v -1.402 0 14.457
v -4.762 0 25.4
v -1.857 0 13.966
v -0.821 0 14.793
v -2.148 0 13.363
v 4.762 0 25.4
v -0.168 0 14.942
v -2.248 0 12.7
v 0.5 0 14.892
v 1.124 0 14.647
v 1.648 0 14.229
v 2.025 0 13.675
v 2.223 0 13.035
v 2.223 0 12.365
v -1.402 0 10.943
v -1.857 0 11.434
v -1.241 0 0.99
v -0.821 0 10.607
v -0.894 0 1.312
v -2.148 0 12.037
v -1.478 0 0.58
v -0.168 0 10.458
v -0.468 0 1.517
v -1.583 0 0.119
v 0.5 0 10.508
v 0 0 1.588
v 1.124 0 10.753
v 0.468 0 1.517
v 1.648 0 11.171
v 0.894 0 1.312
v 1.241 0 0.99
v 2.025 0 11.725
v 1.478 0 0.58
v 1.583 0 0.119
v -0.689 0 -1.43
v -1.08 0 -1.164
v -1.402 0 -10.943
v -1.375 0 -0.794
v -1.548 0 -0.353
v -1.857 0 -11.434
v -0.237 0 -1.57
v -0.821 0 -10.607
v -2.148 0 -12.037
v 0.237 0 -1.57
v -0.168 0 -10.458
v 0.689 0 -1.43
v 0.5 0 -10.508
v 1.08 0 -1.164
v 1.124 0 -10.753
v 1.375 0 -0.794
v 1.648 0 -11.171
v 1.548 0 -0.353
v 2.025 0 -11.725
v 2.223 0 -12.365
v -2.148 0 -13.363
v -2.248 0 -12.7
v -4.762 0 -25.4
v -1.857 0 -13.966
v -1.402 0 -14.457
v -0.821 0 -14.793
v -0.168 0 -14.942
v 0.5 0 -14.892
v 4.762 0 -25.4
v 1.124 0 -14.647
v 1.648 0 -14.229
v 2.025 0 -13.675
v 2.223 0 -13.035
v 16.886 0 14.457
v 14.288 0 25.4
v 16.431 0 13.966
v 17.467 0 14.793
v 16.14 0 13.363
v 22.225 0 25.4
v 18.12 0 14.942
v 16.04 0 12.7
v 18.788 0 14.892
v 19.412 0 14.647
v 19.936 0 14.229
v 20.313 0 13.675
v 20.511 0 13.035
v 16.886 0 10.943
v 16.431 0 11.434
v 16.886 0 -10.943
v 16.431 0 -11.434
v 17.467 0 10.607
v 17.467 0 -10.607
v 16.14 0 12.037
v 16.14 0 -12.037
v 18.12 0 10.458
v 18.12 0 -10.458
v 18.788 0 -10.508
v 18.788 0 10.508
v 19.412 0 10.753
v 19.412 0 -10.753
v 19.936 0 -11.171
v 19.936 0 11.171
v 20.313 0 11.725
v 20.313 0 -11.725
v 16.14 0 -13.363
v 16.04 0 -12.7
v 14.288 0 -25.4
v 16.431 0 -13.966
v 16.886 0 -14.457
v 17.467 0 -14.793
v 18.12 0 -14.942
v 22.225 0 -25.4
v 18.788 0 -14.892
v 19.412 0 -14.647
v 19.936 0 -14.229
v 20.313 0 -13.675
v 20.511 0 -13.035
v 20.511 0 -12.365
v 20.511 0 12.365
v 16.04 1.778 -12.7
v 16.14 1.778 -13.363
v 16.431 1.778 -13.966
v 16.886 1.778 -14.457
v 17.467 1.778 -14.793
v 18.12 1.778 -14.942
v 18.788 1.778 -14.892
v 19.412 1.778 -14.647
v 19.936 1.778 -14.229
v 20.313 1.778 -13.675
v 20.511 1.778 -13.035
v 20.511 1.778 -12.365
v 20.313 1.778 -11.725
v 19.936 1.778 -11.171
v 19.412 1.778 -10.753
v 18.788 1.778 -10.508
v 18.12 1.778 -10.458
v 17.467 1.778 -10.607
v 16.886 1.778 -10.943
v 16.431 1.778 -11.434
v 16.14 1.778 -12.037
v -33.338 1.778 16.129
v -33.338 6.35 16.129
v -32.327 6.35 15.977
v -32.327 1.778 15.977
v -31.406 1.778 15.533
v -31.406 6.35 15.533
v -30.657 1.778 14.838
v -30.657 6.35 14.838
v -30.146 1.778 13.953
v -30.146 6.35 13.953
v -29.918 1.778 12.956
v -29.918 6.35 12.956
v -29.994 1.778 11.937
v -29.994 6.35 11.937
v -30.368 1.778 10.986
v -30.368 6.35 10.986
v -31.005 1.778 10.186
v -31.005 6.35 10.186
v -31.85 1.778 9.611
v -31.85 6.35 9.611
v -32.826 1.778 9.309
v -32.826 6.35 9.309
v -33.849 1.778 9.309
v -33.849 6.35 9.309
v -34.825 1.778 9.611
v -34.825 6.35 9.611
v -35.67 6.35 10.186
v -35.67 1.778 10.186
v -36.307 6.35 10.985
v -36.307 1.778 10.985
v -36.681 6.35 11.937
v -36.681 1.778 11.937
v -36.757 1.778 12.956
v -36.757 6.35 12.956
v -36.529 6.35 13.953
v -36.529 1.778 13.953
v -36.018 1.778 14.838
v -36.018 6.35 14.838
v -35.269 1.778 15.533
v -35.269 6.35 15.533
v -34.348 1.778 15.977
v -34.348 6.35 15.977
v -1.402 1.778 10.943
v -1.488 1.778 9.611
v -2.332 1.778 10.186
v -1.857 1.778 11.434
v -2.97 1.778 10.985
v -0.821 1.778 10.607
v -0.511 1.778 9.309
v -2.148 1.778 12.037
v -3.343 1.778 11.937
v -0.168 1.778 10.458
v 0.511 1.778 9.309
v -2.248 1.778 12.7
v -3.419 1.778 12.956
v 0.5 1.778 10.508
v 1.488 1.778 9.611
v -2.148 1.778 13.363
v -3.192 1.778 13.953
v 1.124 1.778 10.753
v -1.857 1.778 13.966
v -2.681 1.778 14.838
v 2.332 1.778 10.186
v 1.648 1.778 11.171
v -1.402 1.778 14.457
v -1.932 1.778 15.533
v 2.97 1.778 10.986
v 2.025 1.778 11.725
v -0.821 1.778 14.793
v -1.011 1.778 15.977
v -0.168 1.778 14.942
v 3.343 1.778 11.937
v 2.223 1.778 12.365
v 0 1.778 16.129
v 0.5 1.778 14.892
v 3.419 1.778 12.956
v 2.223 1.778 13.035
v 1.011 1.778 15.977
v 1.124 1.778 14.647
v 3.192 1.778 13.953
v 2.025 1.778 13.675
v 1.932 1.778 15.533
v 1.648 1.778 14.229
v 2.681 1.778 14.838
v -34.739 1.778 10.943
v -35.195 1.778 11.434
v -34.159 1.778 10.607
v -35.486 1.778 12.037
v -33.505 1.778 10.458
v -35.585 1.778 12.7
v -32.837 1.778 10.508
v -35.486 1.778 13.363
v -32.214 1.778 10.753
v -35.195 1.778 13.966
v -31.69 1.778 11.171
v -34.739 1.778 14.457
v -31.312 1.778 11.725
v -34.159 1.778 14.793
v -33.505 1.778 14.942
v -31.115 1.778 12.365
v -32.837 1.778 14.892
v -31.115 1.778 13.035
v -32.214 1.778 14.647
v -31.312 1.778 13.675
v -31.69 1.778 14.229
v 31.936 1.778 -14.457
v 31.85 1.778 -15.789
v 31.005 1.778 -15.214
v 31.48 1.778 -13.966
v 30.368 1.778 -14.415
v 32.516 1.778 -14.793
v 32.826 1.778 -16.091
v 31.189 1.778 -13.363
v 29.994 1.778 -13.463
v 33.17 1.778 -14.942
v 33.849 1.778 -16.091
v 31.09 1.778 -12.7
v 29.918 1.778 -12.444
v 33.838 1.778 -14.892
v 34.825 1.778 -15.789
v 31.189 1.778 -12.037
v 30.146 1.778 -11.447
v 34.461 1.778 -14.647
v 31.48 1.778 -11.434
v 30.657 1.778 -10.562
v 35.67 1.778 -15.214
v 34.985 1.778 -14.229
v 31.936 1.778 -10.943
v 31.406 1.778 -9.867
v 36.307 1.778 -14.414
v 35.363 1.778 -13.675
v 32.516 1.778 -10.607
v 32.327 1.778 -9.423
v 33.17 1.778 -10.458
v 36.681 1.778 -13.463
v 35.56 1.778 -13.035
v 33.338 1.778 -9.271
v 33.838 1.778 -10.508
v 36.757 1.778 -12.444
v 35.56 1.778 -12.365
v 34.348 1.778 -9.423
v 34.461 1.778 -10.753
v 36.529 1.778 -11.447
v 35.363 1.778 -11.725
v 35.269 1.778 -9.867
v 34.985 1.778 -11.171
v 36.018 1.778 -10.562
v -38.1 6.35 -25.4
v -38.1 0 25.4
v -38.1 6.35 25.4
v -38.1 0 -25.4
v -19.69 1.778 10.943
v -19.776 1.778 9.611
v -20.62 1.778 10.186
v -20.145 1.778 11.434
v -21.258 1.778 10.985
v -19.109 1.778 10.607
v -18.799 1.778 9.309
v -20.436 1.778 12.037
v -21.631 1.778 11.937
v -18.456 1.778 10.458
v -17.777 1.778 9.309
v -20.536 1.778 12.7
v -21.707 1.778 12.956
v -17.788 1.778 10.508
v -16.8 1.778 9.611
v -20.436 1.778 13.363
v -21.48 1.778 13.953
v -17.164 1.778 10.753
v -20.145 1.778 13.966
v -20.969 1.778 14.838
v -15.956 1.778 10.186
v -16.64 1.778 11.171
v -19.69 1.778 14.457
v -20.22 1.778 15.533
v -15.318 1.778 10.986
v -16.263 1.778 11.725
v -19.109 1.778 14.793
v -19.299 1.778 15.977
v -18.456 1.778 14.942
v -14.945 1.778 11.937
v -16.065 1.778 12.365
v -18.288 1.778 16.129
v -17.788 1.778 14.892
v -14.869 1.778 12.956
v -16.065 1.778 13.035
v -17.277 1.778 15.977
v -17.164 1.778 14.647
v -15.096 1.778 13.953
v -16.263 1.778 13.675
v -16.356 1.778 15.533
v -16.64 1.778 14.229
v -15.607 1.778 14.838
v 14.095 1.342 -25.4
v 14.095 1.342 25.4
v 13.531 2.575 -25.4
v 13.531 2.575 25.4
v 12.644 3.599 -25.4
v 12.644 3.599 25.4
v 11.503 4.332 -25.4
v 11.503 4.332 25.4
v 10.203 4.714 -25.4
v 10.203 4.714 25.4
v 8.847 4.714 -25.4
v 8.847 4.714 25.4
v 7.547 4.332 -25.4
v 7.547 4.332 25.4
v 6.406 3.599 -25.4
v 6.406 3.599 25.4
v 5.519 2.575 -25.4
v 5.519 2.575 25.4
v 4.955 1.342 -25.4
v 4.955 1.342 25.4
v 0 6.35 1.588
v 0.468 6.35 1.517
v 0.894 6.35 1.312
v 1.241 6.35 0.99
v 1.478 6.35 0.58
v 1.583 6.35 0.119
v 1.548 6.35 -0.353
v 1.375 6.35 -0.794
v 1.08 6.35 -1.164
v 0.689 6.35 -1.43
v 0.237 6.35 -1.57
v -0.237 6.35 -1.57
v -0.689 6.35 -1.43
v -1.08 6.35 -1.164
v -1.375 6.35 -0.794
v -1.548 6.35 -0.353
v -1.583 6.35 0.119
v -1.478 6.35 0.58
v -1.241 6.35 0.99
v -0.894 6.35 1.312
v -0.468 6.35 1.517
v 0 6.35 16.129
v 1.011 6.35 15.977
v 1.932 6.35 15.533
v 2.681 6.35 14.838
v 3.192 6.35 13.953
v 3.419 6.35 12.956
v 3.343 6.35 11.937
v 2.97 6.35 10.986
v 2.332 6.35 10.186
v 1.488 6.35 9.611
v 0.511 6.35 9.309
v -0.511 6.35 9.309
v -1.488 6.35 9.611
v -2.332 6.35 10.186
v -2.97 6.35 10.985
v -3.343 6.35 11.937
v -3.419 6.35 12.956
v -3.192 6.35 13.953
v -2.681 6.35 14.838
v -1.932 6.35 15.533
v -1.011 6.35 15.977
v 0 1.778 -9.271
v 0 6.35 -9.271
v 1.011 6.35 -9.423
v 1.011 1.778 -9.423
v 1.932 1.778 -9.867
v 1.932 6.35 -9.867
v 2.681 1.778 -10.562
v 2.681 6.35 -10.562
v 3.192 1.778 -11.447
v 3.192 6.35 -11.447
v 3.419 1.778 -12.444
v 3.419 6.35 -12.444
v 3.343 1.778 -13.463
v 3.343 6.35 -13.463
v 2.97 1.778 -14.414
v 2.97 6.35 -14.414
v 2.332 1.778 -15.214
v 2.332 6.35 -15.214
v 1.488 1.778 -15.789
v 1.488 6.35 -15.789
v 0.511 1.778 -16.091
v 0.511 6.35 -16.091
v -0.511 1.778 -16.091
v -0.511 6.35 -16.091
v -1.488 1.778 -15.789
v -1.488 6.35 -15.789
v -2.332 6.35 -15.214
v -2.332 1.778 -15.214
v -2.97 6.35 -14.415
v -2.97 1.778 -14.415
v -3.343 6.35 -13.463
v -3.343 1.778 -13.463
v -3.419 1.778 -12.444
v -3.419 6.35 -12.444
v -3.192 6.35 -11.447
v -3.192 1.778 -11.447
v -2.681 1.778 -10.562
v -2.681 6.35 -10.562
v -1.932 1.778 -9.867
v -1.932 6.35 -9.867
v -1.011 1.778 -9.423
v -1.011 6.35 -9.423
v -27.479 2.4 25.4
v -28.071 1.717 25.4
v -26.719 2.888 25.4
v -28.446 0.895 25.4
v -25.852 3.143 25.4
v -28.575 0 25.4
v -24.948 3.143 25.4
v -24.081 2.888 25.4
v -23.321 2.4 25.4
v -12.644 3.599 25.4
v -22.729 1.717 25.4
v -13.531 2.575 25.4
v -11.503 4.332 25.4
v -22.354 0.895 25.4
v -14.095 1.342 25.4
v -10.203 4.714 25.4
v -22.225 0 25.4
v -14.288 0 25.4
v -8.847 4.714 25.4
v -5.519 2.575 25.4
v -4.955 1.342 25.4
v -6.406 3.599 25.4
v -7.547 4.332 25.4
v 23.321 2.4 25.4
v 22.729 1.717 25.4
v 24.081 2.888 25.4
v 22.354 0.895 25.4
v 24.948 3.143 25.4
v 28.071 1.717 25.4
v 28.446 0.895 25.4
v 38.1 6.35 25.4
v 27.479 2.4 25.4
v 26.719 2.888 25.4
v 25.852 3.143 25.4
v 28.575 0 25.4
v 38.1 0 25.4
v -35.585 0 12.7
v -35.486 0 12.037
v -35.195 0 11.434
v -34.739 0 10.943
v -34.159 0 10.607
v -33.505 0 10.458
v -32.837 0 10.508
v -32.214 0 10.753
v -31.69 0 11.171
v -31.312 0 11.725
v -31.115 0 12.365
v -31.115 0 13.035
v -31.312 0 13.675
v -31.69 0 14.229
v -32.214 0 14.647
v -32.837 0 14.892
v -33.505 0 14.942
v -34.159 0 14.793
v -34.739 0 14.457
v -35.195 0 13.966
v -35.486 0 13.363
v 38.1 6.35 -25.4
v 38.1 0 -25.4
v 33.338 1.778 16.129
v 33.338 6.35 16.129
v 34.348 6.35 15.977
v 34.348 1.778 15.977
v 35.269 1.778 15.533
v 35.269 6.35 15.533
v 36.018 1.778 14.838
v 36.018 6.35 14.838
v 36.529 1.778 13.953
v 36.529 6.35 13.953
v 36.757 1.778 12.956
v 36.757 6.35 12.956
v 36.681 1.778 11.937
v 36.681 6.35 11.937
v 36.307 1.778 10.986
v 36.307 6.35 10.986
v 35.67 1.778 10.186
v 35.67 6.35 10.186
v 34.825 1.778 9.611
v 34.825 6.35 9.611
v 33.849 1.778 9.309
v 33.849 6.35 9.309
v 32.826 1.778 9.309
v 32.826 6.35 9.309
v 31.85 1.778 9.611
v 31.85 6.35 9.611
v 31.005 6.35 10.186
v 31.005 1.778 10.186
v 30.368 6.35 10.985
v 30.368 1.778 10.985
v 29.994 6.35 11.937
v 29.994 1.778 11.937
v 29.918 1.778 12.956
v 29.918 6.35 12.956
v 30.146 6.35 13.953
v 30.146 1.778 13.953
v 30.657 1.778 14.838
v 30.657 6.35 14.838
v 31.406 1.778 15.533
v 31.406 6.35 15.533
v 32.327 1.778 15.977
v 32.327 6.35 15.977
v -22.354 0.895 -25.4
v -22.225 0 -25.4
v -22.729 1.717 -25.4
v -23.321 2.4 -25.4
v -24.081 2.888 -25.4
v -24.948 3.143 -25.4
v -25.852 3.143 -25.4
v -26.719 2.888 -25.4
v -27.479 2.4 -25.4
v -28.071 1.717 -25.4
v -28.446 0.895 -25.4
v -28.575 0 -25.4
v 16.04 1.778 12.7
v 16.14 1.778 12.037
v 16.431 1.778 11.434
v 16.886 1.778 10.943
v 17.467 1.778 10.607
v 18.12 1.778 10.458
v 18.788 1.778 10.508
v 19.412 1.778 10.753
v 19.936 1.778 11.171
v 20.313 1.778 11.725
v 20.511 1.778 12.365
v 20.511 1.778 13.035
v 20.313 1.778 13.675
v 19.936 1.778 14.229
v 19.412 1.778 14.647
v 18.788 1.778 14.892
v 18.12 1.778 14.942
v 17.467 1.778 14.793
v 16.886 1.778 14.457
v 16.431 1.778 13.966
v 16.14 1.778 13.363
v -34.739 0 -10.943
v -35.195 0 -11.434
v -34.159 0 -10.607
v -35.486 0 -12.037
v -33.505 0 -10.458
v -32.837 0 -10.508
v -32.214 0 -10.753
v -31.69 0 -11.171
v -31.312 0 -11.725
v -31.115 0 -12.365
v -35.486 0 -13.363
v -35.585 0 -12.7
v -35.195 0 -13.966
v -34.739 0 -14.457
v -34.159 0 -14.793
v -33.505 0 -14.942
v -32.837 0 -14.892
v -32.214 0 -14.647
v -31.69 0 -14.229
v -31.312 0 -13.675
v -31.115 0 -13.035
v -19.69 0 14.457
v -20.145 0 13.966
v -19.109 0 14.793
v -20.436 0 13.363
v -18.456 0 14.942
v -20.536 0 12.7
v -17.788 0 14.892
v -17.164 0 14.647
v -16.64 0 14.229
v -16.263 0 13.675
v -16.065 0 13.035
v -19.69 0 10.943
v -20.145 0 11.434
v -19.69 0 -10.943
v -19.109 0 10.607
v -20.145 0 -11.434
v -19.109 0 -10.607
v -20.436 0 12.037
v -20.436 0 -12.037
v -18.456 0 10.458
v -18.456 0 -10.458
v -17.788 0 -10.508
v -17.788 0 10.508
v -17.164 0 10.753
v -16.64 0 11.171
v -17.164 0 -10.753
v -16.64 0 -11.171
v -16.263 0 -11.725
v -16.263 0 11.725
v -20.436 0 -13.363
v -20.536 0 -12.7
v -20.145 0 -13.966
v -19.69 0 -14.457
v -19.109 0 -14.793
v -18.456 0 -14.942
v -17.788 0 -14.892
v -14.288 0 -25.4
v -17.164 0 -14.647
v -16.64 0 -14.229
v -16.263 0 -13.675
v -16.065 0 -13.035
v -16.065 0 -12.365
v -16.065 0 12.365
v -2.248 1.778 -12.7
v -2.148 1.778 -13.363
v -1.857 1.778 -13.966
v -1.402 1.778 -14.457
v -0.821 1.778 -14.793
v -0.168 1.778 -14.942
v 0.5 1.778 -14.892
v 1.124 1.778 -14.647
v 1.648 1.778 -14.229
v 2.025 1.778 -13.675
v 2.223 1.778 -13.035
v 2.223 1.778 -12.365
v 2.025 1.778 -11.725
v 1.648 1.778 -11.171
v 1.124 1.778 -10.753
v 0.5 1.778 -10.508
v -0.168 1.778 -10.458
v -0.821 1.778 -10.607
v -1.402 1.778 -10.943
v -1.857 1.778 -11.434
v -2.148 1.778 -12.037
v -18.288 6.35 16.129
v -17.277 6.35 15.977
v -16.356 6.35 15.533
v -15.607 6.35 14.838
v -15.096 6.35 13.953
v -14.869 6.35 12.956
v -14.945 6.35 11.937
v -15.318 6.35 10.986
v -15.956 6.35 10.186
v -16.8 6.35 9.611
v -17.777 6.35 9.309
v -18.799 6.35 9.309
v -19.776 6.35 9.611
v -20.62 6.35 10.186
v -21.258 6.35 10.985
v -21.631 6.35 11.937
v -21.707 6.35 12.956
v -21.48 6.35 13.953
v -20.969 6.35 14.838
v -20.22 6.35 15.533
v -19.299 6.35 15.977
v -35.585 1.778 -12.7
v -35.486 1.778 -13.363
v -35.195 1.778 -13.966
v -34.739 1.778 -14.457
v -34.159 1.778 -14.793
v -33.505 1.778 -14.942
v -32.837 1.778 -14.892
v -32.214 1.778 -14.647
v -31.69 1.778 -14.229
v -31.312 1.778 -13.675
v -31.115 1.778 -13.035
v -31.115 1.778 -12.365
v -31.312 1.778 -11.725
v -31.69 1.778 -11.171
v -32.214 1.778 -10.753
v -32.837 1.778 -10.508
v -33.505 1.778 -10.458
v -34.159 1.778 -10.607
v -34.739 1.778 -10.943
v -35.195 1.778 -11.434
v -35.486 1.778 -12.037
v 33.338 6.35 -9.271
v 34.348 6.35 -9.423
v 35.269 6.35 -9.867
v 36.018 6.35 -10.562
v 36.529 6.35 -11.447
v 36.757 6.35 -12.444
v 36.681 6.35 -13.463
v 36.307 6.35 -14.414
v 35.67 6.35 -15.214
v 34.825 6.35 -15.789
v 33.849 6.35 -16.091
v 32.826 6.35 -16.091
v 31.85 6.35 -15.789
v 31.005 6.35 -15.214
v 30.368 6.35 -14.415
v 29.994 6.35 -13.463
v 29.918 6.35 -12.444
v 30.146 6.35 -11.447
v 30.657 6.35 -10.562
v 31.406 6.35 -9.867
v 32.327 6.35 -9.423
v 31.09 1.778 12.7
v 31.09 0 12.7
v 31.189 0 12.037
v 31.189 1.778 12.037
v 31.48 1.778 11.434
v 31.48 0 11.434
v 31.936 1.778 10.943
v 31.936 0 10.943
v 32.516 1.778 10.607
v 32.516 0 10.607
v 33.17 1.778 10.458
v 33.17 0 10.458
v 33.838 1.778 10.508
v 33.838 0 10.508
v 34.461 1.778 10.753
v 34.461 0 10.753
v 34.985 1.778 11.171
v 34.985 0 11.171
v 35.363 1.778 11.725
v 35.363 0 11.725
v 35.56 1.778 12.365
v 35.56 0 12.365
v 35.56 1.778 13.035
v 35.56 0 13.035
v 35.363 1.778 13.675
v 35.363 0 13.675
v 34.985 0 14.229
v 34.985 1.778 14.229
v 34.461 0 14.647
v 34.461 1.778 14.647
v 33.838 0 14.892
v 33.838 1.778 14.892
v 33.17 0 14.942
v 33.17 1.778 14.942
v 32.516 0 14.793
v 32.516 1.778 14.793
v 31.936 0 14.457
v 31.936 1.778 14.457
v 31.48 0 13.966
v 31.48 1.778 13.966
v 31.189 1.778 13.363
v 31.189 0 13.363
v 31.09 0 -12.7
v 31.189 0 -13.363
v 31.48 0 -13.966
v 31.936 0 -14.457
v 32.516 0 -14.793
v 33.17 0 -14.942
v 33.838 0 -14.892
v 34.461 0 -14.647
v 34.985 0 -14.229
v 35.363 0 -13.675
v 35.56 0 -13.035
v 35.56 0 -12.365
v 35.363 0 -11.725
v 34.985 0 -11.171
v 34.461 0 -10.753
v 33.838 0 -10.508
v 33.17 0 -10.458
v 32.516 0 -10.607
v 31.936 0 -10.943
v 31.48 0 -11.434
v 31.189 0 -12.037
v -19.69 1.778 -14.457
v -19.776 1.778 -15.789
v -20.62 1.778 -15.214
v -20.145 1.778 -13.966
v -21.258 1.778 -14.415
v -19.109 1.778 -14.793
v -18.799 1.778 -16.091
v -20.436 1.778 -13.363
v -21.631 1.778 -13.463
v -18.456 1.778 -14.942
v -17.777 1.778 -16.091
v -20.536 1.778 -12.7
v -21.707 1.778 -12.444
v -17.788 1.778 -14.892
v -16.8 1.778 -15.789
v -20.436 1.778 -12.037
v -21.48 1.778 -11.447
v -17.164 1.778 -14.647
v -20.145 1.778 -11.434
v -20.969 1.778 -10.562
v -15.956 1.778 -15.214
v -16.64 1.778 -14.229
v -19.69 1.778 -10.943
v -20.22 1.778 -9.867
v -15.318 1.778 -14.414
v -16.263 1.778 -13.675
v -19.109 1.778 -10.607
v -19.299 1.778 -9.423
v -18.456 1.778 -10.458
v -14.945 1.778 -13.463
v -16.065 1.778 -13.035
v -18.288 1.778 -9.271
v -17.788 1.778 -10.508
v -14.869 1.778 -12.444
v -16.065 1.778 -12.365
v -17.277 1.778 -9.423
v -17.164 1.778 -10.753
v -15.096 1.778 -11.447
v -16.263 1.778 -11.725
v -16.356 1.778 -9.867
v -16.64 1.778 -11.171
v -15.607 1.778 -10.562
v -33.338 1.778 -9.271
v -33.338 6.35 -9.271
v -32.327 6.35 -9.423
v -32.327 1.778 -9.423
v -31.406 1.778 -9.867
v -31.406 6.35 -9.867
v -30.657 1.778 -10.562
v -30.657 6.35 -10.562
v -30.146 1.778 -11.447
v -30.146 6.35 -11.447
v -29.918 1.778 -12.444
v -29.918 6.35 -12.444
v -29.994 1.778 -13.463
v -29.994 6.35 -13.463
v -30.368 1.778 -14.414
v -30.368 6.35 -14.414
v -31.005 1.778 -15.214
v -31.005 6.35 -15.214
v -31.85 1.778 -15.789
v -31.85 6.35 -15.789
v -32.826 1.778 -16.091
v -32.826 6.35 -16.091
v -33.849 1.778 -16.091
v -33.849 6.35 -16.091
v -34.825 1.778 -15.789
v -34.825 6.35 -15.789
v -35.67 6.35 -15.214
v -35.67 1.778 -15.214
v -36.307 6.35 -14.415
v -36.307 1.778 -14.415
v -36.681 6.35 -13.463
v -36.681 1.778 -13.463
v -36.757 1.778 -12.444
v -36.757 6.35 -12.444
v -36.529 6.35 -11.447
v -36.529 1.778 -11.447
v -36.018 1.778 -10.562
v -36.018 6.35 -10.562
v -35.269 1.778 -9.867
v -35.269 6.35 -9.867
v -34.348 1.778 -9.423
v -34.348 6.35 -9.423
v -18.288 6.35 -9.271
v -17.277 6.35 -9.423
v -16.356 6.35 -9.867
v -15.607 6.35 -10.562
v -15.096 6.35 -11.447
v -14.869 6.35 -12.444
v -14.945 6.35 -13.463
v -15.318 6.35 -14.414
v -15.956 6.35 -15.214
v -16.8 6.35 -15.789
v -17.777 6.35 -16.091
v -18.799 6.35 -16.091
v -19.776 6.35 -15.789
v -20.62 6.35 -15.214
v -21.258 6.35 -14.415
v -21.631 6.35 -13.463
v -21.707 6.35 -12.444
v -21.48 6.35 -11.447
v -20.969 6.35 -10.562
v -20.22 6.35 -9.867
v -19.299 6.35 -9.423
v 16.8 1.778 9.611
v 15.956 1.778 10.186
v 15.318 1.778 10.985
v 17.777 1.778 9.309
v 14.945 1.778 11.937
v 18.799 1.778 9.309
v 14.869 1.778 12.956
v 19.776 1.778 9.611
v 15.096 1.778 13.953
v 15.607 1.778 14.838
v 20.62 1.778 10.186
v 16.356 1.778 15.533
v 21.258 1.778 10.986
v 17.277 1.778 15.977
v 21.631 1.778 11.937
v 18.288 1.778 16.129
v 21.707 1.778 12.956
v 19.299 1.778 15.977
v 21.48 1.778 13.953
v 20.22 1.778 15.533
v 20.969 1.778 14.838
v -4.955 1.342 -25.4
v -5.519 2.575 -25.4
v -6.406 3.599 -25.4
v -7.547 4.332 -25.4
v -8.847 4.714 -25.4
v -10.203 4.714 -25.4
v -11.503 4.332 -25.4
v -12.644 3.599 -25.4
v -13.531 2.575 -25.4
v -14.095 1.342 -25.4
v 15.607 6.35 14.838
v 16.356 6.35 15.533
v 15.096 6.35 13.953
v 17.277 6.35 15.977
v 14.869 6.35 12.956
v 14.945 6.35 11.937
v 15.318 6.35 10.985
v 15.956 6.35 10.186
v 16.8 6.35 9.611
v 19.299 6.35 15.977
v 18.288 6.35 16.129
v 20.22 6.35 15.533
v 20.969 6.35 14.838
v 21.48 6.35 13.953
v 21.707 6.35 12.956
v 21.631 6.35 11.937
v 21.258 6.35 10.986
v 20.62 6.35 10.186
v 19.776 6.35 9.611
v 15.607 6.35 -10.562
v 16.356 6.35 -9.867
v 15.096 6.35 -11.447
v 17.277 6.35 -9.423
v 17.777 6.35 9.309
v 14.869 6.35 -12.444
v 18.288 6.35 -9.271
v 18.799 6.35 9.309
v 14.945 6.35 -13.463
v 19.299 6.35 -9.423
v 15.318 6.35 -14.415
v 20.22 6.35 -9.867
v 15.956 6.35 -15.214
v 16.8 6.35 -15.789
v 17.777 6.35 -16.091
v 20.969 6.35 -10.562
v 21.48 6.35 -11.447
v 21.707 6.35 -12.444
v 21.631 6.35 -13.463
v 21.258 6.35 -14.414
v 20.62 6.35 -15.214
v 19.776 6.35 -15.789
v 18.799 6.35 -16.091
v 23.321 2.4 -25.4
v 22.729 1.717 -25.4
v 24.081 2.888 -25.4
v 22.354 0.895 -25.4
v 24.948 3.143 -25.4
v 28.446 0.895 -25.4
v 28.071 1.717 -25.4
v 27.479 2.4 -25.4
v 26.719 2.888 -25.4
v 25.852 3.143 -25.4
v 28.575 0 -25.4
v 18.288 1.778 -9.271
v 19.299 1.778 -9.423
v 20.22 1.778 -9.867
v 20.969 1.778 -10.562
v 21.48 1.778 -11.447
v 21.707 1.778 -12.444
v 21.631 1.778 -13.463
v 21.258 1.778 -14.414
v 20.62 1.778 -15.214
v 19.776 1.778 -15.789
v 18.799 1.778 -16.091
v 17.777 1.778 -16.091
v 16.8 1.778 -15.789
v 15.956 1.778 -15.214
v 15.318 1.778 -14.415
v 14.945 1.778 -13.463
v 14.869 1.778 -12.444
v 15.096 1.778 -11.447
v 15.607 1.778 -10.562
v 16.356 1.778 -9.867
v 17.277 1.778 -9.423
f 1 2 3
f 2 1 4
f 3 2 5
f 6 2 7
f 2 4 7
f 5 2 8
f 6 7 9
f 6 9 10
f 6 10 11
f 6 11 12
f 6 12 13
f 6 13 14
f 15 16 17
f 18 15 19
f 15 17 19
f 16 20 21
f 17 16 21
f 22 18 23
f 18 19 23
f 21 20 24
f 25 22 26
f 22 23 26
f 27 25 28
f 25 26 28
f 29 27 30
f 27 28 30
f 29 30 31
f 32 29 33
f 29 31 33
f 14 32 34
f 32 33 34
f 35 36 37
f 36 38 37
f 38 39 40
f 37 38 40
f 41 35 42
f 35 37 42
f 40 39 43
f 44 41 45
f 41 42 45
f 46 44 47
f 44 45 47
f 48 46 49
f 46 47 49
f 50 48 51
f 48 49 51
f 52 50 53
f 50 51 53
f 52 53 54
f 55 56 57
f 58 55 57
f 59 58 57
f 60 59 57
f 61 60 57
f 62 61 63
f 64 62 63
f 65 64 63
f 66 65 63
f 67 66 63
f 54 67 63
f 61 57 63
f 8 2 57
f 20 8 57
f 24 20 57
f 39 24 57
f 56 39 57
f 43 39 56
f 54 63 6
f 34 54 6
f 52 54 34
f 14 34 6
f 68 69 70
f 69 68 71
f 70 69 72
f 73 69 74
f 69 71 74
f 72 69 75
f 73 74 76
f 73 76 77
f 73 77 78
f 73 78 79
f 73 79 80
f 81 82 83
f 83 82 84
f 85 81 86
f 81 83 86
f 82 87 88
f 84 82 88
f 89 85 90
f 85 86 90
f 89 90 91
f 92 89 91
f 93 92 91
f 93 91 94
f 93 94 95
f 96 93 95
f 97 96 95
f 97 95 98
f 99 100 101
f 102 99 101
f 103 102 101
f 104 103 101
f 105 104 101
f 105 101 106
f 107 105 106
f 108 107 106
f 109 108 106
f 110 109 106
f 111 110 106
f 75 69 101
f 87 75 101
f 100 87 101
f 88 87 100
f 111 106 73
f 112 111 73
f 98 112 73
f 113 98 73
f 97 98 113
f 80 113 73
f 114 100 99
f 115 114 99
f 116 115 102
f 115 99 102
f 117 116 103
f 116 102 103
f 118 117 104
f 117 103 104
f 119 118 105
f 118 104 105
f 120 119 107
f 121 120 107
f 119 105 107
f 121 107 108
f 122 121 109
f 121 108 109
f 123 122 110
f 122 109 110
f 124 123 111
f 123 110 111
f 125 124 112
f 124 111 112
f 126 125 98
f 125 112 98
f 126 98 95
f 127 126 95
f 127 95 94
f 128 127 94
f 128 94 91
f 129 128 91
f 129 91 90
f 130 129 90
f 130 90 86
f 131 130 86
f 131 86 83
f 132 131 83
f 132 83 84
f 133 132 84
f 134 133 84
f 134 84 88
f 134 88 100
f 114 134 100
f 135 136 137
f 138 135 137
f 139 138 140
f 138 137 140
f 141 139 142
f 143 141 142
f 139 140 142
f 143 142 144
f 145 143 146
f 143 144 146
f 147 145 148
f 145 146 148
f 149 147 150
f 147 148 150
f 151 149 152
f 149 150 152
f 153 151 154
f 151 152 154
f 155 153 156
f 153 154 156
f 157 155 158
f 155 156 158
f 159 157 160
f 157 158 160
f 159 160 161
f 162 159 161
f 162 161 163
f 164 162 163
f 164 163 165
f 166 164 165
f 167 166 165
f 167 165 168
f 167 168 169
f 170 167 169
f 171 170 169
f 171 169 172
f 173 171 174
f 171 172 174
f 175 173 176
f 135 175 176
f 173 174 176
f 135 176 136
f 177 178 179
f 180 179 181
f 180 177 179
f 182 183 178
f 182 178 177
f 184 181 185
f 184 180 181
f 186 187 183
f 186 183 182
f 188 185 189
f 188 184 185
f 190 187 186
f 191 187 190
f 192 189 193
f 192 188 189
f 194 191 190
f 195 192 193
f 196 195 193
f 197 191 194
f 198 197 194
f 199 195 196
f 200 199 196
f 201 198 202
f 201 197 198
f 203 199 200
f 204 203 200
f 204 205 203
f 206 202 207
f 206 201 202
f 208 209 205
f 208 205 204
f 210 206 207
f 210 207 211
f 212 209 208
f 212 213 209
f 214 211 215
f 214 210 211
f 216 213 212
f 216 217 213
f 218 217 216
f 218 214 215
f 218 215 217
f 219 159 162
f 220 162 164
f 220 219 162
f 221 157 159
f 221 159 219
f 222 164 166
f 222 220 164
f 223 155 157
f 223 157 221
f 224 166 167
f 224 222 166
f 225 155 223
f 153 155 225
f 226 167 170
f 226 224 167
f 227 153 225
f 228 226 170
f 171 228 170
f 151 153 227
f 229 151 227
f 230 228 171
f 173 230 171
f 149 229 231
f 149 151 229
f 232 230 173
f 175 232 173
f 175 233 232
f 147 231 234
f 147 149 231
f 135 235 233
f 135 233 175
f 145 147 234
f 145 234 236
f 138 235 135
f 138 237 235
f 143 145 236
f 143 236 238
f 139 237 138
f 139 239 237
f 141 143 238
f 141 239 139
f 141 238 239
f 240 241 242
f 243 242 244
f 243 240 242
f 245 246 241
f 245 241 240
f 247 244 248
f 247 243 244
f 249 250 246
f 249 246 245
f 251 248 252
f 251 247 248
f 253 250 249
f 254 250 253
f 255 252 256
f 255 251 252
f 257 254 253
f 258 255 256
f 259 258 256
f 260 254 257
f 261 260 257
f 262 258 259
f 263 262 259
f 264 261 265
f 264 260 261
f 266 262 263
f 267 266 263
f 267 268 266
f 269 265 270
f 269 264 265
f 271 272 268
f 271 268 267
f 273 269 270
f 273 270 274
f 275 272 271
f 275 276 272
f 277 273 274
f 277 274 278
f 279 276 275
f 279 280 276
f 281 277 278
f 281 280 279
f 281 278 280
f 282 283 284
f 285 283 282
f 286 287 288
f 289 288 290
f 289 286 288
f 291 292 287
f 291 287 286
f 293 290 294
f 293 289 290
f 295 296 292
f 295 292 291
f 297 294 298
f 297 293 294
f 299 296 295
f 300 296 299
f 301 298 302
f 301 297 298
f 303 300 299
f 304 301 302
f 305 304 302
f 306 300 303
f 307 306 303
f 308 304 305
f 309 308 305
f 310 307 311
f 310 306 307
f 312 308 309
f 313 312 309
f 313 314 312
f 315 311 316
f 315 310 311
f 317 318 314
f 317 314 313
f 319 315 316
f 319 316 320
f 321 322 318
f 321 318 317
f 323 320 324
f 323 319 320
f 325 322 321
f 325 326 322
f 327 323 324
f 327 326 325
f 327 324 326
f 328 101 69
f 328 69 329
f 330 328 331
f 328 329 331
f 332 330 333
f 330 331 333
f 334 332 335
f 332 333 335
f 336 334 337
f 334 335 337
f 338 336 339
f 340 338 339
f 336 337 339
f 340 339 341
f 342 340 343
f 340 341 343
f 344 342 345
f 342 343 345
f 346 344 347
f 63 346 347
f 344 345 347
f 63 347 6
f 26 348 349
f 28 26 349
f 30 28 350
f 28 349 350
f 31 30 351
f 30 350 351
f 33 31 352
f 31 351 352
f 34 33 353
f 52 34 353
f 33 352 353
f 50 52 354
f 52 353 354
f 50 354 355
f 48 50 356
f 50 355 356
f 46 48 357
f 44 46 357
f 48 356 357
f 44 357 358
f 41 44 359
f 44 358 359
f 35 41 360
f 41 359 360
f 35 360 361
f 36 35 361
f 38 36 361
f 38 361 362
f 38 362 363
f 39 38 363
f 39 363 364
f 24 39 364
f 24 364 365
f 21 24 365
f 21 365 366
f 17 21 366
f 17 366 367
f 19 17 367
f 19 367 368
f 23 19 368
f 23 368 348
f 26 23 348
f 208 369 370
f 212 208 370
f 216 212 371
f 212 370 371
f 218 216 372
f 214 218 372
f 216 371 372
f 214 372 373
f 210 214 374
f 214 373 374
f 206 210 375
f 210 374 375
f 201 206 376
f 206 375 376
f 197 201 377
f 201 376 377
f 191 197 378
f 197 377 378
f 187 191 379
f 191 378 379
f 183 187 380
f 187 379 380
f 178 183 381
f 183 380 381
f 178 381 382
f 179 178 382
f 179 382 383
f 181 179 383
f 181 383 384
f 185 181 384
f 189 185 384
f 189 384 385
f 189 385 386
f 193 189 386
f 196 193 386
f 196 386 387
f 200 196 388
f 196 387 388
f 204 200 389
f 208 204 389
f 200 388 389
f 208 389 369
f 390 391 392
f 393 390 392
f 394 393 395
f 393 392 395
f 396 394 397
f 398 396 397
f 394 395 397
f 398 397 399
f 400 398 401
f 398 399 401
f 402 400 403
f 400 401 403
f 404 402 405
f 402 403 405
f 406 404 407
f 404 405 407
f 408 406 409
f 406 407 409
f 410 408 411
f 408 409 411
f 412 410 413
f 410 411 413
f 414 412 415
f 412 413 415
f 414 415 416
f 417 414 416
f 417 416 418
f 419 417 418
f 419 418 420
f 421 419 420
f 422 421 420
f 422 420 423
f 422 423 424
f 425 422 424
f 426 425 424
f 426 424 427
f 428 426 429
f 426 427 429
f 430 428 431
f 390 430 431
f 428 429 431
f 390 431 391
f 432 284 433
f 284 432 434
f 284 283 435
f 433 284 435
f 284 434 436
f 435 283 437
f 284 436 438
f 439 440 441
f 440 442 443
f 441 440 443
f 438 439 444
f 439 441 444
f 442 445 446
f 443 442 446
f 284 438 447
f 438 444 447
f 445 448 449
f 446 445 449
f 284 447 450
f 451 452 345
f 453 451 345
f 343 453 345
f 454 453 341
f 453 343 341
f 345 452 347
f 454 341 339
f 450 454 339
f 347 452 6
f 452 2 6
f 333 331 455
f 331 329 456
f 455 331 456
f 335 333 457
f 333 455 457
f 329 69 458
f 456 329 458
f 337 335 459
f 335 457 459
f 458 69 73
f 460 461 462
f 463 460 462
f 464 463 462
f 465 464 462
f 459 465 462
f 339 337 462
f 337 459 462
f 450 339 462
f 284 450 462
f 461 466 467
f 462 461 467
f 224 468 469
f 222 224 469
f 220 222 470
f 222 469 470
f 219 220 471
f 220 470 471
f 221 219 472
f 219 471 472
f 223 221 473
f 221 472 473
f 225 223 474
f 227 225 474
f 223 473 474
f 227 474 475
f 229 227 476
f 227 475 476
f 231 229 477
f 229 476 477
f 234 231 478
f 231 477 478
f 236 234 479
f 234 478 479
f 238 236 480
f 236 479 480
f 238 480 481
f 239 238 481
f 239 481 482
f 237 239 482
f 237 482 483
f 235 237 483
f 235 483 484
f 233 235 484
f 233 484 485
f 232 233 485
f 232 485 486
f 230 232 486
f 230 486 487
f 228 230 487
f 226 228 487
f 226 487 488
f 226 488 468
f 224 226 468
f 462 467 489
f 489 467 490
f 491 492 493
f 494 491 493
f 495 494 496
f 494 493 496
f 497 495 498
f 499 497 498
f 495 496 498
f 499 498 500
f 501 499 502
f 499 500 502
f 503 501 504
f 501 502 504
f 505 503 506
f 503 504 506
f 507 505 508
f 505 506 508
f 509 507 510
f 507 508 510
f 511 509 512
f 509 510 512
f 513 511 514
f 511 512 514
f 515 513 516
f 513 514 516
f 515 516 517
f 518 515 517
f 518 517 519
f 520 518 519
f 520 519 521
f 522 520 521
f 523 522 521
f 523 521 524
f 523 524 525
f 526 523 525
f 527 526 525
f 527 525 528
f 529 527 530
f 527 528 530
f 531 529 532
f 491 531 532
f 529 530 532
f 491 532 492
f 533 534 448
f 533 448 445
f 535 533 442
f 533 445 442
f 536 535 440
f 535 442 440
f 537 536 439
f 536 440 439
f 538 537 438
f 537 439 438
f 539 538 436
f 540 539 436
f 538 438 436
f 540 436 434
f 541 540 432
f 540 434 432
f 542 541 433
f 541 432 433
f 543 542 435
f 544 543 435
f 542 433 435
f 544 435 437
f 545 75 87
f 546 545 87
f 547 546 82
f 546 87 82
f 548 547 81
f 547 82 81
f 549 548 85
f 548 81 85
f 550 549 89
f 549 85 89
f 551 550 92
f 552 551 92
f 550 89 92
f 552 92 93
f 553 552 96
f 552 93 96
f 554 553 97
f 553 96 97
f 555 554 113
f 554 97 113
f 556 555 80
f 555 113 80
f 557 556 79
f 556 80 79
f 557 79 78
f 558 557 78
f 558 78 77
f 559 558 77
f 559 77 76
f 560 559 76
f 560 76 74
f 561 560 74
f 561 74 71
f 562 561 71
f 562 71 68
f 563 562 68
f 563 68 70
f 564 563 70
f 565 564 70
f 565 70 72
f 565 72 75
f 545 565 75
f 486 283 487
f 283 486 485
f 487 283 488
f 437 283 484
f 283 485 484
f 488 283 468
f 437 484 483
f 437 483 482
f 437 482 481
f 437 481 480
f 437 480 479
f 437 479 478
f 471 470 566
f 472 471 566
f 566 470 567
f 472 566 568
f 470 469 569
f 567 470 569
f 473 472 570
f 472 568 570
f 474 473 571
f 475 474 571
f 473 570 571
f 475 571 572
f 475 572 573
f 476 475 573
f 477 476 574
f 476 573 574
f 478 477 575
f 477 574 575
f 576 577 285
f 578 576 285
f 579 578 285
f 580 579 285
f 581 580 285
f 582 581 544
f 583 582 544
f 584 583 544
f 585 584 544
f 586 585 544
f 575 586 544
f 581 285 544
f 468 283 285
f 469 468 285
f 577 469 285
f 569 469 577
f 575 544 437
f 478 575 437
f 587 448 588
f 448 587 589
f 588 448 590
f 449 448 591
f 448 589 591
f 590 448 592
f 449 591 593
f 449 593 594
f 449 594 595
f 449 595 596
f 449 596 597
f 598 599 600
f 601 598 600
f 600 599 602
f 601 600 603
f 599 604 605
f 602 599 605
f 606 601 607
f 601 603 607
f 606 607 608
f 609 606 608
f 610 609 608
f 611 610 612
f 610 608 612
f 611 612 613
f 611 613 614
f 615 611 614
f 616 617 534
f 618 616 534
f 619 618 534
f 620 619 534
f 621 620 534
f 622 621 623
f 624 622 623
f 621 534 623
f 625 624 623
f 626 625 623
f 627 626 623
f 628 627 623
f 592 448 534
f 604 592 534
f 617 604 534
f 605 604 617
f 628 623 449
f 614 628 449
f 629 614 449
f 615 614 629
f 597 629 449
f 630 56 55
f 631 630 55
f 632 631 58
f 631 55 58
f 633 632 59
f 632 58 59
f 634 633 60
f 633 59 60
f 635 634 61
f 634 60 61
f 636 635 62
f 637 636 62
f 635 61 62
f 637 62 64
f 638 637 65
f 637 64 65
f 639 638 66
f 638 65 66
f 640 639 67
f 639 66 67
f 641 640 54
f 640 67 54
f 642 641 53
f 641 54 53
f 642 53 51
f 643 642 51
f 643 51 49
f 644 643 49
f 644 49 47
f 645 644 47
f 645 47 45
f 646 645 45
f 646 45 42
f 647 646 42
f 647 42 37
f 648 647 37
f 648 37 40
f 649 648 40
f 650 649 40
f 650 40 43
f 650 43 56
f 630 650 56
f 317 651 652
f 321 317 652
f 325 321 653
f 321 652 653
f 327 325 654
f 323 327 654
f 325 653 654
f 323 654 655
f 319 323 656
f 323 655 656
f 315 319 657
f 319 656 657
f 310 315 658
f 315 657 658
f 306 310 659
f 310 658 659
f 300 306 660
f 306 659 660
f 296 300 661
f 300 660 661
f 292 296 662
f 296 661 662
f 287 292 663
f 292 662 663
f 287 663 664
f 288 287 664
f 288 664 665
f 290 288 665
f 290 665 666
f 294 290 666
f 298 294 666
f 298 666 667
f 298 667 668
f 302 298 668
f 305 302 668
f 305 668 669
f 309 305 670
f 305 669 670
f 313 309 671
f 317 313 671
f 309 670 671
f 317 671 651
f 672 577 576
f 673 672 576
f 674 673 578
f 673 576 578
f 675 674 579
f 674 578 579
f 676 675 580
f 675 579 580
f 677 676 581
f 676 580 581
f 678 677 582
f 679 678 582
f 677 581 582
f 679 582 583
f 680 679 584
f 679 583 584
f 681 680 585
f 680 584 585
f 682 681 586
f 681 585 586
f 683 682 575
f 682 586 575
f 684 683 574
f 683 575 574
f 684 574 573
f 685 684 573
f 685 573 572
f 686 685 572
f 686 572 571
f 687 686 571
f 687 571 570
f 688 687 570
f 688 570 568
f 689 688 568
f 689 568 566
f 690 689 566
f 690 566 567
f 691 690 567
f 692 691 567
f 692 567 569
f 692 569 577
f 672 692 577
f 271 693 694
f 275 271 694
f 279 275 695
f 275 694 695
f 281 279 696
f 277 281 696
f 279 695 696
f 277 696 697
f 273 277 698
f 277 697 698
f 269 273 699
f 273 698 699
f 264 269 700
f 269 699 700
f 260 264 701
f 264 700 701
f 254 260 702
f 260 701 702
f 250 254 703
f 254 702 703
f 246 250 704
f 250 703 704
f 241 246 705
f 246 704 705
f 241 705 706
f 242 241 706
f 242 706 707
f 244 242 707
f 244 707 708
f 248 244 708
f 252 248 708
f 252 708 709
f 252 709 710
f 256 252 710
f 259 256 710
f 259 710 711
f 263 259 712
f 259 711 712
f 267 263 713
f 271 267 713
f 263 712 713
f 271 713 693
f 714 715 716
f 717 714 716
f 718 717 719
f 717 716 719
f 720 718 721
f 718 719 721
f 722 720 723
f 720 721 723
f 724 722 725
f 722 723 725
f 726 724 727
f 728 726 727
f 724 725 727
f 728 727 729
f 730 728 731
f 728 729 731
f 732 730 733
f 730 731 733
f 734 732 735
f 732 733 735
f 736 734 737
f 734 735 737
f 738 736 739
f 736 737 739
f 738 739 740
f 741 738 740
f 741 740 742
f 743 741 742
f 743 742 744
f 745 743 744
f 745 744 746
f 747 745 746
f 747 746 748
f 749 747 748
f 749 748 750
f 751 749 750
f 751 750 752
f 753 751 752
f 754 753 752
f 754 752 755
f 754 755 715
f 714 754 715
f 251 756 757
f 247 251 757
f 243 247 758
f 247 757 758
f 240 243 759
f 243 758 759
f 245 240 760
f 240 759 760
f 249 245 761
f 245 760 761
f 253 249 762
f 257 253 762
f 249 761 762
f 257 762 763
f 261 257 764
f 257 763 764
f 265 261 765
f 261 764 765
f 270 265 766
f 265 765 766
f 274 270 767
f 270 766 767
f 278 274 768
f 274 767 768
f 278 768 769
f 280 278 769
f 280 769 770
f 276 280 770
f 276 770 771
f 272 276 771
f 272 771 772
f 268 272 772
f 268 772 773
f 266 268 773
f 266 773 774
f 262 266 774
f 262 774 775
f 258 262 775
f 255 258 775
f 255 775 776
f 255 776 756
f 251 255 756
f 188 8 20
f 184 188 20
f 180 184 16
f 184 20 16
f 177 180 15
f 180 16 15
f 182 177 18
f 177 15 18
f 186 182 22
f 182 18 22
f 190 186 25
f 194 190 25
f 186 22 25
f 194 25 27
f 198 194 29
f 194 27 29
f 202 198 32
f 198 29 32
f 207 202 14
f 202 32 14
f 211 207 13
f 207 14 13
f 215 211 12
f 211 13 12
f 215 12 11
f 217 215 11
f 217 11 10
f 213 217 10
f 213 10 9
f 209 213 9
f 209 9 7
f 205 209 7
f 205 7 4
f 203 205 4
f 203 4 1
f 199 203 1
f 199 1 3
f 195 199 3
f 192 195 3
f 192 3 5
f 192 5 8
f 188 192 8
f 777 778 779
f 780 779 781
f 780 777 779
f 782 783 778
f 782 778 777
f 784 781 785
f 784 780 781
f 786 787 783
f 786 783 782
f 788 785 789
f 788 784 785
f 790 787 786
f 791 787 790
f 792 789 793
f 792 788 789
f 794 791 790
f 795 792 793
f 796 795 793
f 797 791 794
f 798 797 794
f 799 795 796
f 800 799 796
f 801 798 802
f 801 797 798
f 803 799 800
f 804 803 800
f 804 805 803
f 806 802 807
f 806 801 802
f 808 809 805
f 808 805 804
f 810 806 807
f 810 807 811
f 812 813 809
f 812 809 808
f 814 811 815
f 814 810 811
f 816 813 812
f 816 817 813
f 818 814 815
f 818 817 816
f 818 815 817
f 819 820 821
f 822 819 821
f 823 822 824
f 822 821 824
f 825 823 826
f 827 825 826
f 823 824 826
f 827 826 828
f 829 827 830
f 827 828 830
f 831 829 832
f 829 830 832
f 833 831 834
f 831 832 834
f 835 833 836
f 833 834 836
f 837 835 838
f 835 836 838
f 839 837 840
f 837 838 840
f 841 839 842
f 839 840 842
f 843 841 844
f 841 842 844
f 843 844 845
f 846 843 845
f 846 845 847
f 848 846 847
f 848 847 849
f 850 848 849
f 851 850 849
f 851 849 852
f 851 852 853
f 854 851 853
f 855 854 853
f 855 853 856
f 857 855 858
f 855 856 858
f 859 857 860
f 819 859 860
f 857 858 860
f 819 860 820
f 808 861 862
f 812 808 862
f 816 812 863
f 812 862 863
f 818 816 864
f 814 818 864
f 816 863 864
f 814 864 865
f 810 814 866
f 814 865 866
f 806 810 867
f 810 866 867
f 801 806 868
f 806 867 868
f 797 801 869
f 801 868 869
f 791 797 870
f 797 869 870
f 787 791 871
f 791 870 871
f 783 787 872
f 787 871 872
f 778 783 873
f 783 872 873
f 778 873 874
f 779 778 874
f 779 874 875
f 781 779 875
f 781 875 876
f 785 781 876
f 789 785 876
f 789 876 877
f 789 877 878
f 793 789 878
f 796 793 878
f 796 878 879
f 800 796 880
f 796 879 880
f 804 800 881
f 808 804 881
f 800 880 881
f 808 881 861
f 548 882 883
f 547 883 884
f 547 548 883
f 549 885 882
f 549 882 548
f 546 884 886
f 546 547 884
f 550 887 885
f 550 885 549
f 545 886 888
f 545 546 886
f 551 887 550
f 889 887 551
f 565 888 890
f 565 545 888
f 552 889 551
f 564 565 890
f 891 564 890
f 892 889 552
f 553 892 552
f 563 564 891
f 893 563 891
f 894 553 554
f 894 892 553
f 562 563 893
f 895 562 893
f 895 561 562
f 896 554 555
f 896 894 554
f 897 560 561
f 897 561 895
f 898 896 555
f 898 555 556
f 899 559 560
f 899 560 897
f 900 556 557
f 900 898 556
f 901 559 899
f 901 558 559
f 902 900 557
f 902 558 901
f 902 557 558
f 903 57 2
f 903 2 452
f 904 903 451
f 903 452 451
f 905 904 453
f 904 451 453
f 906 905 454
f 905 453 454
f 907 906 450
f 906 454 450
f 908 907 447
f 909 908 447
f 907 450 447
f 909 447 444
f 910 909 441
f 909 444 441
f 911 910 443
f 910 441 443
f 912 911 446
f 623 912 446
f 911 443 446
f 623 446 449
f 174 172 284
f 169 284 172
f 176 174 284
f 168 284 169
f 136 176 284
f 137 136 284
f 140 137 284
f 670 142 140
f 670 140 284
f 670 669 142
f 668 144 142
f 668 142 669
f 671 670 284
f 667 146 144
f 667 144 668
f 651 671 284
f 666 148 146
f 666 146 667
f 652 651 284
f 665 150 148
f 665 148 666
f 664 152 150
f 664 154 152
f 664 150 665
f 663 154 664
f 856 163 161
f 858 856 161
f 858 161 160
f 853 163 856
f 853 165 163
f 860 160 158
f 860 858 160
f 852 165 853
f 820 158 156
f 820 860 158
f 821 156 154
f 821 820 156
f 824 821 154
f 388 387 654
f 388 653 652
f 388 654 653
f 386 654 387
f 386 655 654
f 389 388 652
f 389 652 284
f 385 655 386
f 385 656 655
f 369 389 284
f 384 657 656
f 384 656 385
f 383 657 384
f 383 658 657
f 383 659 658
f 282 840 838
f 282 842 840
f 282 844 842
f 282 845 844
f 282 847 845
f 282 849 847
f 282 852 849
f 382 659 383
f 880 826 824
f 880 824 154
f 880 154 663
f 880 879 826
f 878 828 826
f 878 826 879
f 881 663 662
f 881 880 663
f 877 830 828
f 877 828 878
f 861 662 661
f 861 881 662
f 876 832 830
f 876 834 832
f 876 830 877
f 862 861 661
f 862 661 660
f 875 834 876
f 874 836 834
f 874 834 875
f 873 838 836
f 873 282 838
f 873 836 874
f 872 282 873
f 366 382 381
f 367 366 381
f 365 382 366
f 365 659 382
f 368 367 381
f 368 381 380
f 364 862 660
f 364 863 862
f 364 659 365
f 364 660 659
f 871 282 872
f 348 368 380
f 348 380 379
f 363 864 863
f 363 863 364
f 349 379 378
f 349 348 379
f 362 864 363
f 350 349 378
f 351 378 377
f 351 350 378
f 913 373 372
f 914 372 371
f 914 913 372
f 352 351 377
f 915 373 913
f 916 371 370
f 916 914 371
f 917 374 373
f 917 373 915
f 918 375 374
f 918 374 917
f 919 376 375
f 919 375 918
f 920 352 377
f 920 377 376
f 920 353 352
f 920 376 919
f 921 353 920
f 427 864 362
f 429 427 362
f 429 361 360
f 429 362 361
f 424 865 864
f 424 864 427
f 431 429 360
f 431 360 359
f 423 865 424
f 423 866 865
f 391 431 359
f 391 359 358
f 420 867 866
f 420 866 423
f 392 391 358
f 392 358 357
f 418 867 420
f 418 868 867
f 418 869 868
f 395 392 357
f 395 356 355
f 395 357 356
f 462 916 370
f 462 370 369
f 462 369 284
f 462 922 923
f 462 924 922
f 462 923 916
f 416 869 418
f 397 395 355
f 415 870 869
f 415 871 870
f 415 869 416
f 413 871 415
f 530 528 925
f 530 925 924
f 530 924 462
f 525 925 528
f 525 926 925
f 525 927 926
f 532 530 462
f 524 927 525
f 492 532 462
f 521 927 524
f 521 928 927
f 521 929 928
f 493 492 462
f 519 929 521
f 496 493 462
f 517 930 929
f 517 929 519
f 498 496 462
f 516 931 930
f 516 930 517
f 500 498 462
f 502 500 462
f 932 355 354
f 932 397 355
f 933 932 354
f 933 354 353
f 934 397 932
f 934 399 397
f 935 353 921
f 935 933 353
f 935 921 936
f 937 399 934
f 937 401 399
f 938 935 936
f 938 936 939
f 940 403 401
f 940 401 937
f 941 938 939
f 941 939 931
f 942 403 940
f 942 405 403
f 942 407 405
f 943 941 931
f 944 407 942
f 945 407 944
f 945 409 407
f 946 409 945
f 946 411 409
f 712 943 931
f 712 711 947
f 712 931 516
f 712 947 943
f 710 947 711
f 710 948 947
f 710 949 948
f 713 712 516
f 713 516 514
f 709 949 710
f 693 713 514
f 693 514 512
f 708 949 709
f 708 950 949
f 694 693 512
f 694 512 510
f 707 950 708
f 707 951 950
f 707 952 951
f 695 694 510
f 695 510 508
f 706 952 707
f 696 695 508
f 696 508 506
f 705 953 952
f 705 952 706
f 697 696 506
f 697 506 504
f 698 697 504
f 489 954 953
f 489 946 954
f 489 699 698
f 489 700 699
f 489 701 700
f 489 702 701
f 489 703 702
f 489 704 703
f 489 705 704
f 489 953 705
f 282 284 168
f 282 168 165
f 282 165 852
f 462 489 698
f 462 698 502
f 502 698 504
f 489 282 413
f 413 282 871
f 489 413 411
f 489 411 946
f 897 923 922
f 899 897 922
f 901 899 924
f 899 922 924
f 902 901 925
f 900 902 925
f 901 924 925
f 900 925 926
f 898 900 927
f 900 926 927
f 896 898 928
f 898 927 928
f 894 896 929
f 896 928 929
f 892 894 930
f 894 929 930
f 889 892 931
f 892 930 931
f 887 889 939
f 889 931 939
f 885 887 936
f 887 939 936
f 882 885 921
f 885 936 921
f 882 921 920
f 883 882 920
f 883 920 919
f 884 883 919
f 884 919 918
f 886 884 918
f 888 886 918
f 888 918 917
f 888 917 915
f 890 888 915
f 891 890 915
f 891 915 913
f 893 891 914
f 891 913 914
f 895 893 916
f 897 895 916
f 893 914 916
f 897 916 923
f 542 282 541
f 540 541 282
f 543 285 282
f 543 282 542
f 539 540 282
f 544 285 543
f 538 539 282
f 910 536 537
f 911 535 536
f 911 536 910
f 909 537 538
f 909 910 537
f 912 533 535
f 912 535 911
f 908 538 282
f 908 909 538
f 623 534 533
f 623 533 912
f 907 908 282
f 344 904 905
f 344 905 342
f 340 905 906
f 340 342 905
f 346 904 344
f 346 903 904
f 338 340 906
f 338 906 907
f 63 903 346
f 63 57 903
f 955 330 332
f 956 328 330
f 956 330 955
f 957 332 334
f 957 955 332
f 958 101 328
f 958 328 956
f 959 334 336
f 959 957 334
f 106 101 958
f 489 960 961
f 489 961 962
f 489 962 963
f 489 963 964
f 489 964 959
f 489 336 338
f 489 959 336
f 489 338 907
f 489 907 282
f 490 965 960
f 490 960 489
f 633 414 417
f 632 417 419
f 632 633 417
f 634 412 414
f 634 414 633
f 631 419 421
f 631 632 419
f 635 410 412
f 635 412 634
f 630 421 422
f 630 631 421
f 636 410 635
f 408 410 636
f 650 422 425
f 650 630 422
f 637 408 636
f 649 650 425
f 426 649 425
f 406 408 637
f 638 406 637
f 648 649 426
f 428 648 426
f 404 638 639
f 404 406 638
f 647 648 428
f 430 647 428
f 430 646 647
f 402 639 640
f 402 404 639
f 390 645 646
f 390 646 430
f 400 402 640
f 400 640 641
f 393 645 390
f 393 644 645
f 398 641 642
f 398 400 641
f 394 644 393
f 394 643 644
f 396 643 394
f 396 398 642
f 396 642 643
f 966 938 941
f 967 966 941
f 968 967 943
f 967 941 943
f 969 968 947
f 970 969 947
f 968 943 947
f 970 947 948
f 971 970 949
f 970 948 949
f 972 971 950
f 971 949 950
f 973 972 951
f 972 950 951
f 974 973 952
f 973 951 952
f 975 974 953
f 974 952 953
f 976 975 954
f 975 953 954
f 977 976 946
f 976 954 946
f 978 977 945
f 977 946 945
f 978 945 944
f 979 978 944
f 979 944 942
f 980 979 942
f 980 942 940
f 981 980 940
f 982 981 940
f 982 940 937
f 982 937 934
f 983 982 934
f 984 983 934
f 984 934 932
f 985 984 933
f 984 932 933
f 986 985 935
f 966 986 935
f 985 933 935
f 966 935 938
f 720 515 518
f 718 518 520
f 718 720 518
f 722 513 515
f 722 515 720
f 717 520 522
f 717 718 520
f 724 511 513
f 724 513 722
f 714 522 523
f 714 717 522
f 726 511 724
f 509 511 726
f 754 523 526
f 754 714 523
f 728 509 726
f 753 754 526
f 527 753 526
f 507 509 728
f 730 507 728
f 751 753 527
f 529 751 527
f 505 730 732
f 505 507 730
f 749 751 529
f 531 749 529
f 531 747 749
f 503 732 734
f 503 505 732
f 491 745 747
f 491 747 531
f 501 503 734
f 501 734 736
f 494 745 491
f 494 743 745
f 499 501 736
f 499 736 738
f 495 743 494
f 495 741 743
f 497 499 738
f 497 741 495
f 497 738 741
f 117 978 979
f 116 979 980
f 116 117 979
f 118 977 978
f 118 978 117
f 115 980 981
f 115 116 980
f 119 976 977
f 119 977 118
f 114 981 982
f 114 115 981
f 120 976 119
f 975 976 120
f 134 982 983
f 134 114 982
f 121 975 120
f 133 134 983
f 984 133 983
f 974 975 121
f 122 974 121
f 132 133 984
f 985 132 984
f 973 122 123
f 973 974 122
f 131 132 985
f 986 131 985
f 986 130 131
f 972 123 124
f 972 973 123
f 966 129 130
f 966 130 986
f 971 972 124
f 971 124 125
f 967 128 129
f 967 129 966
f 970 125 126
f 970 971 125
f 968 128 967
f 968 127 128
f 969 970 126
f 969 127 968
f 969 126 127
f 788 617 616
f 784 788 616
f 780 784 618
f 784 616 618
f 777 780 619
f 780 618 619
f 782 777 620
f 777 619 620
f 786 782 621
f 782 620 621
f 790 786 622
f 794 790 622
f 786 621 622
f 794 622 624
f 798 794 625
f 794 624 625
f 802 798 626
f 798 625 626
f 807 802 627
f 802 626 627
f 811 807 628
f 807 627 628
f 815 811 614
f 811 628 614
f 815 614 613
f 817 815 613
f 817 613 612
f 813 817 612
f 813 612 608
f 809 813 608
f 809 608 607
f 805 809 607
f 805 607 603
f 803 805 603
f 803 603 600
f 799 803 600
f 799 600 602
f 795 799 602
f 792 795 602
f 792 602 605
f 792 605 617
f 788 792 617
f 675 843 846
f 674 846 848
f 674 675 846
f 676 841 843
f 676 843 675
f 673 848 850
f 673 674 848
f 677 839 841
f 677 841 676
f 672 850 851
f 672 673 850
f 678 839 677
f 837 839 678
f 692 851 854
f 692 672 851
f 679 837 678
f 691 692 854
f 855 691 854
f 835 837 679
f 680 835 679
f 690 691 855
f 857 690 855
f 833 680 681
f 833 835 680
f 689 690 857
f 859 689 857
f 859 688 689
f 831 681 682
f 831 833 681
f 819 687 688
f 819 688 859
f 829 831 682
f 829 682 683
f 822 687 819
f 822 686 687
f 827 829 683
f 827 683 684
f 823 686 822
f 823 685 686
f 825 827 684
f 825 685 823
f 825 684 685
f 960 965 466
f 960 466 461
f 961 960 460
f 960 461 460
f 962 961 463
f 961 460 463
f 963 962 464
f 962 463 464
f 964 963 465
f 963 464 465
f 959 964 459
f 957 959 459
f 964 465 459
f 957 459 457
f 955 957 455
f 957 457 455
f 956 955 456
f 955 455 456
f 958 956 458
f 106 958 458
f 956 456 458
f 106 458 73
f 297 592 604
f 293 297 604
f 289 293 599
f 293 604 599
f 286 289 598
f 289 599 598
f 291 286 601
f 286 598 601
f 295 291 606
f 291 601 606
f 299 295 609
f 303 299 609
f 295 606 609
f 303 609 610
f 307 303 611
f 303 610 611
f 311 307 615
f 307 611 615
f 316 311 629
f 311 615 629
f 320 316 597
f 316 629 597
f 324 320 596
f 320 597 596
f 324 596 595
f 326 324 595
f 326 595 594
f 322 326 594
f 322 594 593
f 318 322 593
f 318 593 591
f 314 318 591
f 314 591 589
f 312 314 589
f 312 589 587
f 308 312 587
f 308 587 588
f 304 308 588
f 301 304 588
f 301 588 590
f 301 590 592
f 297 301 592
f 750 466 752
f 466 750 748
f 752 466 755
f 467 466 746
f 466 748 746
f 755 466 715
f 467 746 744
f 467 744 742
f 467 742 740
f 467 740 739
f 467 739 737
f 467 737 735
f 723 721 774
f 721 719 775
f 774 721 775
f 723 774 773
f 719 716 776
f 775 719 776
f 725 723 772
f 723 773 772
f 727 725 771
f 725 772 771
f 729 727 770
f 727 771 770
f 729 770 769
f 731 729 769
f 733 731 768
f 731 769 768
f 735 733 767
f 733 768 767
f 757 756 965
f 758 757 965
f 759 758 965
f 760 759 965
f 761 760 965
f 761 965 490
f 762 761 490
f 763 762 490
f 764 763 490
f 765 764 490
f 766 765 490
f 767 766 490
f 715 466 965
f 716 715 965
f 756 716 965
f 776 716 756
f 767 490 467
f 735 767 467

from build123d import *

# Parameters (mm, degrees)
SKETCH1_W             = 76.2
SKETCH1_H             = 50.8
BOSS_EXTRUDE1_DEPTH   = 6.35
SKETCH2_R             = 3.175
CUT_EXTRUDE1_DEPTH    = 64.816710194
SKETCH3_R             = 4.7625
CUT_EXTRUDE2_DEPTH    = 64.816710194
F_8_CLEARANCE_HOLE1_D = 4.4958
SKETCH6_R             = 3.429
CUT_EXTRUDE3_DEPTH    = 4.572
SKETCH7_R             = 1.5875
CUT_EXTRUDE4_DEPTH    = 47.228697797


with BuildPart() as part:
    # Sketch1 → Boss-Extrude1 (new body)
    with BuildSketch(Plane(origin=(0, 0, 0), x_dir=(1, 0, 0), z_dir=(0, 1, 0))):
        Rectangle(SKETCH1_W, SKETCH1_H)
    extrude(amount=BOSS_EXTRUDE1_DEPTH)

    # Sketch2 → Cut-Extrude1 (cut, through all)
    with BuildSketch(Plane.XY.offset(25.4)):
        with Locations((-25.4, 0)):
            Circle(SKETCH2_R)
        with Locations((25.4, 0)):
            Circle(SKETCH2_R)
    extrude(amount=-CUT_EXTRUDE1_DEPTH, mode=Mode.SUBTRACT)

    # Sketch3 → Cut-Extrude2 (cut, through all)
    with BuildSketch(Plane.XY.offset(25.4)):
        with Locations((-9.525, 0)):
            Circle(SKETCH3_R)
        with Locations((9.525, 0)):
            Circle(SKETCH3_R)
    extrude(amount=-CUT_EXTRUDE2_DEPTH, mode=Mode.SUBTRACT)

    # #8 Clearance Hole1 (through all)
    with Locations(Plane(origin=(0, 6.35, 0), x_dir=(1, 0, 0), z_dir=(0, 1, 0))):
        with Locations((-33.3375, 12.7), (-33.3375, -12.7), (-18.288, -12.7), (0, -12.7), (18.288, -12.7), (33.3375, -12.7), (33.3375, 12.7), (18.288, 12.7), (0, 12.7), (-18.288, 12.7)):
            Hole(F_8_CLEARANCE_HOLE1_D / 2)

    # Sketch6 → Cut-Extrude3 (cut)
    with BuildSketch(Plane(origin=(0, 6.35, 0), x_dir=(1, 0, 0), z_dir=(0, 1, 0))):
        with Locations(Location((-33.3375, 12.7, 0), (0, 0, 270))):
            Circle(SKETCH6_R)
        with Locations(Location((-18.288, 12.7, 0), (0, 0, 270))):
            Circle(SKETCH6_R)
        with Locations(Location((0, 12.7, 0), (0, 0, 270))):
            Circle(SKETCH6_R)
        with Locations(Location((18.288, 12.7, 0), (0, 0, 270))):
            Circle(SKETCH6_R)
        with Locations(Location((33.3375, 12.7, 0), (0, 0, 270))):
            Circle(SKETCH6_R)
        with Locations(Location((33.3375, -12.7, 0), (0, 0, 270))):
            Circle(SKETCH6_R)
        with Locations(Location((18.288, -12.7, 0), (0, 0, 270))):
            Circle(SKETCH6_R)
        with Locations(Location((0, -12.7, 0), (0, 0, 270))):
            Circle(SKETCH6_R)
        with Locations(Location((-18.288, -12.7, 0), (0, 0, 270))):
            Circle(SKETCH6_R)
        with Locations(Location((-33.3375, -12.7, 0), (0, 0, 270))):
            Circle(SKETCH6_R)
    extrude(amount=-CUT_EXTRUDE3_DEPTH, mode=Mode.SUBTRACT)

    # Sketch7 → Cut-Extrude4 (cut, through all)
    with BuildSketch(Plane(origin=(0, 6.35, 0), x_dir=(1, 0, 0), z_dir=(0, 1, 0))):
        with Locations(Location((0, 0, 0), (0, 0, 270))):
            Circle(SKETCH7_R)
    extrude(amount=-CUT_EXTRUDE4_DEPTH, mode=Mode.SUBTRACT)


solid = part.part
